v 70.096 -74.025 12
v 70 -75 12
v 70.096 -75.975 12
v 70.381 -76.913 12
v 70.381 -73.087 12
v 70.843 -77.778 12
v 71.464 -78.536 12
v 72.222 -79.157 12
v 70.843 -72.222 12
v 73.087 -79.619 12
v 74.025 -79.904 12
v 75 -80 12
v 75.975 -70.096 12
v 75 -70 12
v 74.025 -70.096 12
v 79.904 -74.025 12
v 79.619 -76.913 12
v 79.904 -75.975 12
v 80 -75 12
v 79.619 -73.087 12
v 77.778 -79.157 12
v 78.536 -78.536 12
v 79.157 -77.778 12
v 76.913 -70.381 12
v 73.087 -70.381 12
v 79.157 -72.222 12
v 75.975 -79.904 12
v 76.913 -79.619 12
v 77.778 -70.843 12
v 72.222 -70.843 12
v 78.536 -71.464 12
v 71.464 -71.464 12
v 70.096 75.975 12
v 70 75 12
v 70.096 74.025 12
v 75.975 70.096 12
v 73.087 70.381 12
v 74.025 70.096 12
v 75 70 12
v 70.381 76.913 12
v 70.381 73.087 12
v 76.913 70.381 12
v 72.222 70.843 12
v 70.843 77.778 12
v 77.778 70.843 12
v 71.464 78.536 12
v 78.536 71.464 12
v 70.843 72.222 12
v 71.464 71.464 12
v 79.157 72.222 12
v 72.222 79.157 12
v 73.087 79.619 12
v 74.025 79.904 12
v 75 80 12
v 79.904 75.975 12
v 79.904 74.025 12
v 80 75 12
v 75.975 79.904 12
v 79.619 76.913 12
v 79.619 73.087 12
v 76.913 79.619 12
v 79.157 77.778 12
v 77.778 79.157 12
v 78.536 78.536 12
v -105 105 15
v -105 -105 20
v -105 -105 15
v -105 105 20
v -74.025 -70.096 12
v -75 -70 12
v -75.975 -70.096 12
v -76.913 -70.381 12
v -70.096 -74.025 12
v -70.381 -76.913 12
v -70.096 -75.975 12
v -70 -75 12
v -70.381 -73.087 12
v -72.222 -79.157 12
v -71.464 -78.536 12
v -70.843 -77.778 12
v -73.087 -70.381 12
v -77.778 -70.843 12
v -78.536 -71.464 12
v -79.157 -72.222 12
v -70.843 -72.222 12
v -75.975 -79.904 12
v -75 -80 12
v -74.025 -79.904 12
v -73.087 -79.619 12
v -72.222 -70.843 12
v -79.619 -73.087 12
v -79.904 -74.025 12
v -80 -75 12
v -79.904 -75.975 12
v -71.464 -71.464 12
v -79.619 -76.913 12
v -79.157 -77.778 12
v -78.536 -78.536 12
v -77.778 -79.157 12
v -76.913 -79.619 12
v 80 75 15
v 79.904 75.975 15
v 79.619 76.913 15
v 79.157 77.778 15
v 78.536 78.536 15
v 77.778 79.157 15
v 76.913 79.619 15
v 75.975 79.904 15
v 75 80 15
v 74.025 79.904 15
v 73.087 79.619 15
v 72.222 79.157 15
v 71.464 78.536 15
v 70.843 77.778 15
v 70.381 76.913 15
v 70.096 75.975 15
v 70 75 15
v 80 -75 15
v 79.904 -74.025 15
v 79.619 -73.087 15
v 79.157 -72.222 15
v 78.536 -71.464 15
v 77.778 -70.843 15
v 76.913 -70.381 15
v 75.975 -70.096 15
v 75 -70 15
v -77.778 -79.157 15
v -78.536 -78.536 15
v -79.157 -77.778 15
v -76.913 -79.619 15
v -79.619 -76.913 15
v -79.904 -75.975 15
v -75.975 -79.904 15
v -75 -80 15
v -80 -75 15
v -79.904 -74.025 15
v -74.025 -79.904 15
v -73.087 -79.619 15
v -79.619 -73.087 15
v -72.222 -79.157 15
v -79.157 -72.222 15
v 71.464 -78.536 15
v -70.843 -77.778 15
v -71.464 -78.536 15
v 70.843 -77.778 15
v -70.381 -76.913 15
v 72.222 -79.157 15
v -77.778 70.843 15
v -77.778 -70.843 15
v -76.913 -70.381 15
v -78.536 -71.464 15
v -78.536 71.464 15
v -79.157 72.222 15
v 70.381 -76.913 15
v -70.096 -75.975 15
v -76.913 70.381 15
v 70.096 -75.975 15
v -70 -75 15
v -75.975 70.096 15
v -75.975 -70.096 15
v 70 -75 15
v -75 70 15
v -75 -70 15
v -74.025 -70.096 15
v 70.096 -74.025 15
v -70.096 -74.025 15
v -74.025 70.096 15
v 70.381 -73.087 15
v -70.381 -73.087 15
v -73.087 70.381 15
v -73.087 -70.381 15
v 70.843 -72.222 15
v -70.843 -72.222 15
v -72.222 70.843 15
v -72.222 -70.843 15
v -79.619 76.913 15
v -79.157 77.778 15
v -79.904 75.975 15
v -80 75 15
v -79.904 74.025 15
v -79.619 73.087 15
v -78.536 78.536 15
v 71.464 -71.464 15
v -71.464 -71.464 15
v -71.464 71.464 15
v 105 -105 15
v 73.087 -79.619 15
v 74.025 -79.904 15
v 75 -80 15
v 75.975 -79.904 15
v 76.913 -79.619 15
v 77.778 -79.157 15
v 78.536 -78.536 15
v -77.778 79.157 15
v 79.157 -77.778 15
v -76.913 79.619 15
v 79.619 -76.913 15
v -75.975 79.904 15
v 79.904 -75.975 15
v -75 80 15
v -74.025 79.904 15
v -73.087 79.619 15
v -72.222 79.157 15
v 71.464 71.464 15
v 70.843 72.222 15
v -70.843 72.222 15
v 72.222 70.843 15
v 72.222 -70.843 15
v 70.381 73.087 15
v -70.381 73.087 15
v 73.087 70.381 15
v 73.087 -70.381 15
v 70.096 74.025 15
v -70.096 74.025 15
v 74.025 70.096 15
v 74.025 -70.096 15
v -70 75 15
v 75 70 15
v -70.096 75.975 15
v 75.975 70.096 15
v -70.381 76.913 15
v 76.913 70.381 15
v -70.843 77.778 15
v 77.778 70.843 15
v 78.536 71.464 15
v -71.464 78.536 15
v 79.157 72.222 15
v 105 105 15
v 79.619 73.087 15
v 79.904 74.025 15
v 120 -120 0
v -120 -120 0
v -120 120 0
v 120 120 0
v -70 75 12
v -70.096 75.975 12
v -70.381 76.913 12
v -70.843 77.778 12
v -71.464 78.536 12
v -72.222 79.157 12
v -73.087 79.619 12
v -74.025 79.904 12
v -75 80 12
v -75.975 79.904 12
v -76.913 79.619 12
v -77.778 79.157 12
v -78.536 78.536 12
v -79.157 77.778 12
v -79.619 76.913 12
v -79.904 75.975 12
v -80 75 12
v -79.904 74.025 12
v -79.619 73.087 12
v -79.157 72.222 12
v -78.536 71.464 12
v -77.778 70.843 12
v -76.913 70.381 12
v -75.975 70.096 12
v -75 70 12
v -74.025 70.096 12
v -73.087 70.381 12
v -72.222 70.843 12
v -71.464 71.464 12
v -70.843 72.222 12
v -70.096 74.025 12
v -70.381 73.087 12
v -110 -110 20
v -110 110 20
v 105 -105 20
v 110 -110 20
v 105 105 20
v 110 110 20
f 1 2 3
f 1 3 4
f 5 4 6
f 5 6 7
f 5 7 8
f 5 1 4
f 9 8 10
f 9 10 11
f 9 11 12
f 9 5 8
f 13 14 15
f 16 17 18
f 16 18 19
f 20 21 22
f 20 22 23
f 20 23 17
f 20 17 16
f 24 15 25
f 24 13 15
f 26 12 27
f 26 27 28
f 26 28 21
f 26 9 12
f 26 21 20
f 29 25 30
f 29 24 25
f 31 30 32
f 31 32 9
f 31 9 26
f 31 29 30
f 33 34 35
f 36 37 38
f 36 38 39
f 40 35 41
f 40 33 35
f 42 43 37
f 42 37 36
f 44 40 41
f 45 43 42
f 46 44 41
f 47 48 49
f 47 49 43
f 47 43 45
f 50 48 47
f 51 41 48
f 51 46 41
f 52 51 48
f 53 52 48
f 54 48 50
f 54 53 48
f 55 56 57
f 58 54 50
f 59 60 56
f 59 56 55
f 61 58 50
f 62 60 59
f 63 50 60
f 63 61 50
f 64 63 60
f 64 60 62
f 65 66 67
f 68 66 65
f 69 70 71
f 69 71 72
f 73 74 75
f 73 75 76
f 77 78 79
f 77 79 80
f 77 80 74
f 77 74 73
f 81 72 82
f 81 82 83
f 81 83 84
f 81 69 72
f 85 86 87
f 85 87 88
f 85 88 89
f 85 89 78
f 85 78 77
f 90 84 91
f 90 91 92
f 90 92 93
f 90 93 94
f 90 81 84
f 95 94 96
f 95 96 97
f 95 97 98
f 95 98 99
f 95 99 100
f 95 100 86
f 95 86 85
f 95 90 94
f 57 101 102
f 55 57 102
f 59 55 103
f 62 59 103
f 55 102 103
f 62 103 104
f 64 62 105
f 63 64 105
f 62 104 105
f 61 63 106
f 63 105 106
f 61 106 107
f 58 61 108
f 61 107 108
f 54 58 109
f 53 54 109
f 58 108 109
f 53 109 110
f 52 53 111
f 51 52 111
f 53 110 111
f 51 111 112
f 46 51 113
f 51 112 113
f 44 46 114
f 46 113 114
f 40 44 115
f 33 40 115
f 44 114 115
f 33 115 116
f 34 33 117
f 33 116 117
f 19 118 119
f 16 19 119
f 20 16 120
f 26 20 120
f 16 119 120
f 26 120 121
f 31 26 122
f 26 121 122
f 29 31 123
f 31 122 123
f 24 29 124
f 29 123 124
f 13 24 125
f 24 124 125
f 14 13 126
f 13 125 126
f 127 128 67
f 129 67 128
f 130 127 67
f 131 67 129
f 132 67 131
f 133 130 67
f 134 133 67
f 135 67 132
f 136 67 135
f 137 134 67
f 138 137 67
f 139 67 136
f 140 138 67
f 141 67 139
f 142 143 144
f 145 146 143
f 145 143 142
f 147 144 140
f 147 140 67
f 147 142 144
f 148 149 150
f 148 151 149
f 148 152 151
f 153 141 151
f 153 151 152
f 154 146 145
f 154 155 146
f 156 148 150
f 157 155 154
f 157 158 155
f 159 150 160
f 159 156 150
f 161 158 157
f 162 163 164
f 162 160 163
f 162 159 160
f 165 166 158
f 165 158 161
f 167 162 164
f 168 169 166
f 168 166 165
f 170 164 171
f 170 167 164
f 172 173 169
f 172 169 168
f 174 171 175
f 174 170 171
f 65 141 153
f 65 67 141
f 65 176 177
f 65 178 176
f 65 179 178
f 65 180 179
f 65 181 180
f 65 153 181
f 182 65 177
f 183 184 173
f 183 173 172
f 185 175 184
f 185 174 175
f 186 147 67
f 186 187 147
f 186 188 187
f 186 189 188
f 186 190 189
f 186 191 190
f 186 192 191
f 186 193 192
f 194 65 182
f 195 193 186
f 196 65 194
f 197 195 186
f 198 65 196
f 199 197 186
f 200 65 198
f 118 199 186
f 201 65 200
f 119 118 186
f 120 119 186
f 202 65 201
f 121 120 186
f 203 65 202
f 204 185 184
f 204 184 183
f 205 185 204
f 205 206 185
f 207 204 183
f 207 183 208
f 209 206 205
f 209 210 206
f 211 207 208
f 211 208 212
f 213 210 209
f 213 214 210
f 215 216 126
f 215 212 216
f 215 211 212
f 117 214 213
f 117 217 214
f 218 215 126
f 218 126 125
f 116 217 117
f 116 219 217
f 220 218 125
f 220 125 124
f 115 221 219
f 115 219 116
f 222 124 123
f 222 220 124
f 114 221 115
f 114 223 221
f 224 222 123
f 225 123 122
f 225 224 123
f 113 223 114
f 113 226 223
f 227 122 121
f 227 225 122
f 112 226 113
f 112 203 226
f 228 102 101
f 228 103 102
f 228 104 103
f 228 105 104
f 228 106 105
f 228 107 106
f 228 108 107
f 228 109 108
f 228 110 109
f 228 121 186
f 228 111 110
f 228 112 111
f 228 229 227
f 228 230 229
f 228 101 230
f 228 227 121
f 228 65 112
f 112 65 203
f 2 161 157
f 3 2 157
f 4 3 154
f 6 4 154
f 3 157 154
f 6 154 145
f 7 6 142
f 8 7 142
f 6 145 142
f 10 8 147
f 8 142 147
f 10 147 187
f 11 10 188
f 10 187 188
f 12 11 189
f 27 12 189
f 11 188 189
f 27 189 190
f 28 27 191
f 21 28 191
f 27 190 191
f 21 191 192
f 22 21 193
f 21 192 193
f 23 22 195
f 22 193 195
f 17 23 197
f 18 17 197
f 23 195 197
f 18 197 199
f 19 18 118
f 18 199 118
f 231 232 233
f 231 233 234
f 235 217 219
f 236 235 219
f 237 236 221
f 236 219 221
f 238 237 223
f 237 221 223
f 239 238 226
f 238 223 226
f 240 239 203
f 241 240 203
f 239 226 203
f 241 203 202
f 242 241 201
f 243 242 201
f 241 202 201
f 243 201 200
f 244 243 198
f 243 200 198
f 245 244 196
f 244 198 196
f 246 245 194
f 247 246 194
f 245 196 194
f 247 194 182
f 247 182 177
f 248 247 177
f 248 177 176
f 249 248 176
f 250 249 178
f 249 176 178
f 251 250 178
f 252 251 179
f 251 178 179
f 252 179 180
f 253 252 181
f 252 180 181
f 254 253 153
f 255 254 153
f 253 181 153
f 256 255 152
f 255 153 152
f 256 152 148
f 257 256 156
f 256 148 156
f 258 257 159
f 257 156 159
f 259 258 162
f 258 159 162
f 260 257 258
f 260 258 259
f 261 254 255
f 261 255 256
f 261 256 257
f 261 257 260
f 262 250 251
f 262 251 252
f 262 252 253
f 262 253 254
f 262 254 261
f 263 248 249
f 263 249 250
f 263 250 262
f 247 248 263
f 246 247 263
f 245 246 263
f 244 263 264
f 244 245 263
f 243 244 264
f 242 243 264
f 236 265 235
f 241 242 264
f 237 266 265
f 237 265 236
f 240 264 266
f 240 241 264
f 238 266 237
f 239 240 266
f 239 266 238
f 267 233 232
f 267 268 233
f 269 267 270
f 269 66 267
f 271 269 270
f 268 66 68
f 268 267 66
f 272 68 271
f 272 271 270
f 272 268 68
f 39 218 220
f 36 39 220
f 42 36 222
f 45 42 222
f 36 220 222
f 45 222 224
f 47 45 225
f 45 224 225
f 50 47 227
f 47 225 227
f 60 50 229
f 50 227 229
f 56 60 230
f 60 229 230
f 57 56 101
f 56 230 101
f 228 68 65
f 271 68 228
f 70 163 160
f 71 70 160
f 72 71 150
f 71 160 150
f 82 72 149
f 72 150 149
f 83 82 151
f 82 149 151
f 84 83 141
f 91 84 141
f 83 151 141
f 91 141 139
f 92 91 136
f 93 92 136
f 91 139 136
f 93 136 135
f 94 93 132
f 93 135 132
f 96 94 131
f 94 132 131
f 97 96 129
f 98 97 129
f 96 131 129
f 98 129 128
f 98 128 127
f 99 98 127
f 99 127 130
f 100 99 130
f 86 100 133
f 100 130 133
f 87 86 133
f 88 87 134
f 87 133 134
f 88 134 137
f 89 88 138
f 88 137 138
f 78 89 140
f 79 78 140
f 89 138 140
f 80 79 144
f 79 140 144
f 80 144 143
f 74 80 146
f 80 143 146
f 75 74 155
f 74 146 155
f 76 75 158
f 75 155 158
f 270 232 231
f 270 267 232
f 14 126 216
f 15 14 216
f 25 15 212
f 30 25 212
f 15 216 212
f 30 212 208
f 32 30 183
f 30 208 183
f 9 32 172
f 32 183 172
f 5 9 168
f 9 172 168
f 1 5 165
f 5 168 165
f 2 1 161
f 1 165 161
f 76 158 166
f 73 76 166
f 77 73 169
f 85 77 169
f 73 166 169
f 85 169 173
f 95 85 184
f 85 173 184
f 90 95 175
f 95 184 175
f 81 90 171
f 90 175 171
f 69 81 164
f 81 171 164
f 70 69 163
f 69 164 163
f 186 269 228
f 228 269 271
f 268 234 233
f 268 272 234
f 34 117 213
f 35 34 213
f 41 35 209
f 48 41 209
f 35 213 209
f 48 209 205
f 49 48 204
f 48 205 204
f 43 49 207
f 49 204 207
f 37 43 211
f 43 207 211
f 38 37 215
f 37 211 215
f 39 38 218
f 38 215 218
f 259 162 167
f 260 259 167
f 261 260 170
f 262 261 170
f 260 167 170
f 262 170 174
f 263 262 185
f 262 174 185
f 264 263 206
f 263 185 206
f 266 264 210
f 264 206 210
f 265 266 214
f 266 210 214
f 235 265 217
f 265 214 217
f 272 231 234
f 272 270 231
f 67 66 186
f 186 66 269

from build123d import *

# Parameters (mm, degrees)
F0_W     = 240
F0_H     = 240
F2_W     = 220
F2_H     = 220
F4_W     = 210
F4_H     = 210
F5_DEPTH = 5
F7_DEPTH = 3


with BuildPart() as f3:
    # F0 (on Top) → F3 section 0
    with BuildSketch(Plane.XY):
        Rectangle(F0_W, F0_H)
    # F2 (on offset) → F3 section 1
    with BuildSketch(Plane.XY.offset(20)):
        Rectangle(F2_W, F2_H)
    loft()

    # F4 (on face) → F5 (cut)
    with BuildSketch(Plane.XY.offset(20)):
        Rectangle(F4_W, F4_H)
    extrude(amount=-F5_DEPTH, mode=Mode.SUBTRACT)

    # F6 (on face) → F7 (cut)
    with BuildSketch(Plane.XY.offset(15)):
        with BuildLine():
            ThreePointArc((-70, 75), (-78.5355339059, 78.5355339059), (-75, 70))
            Line((-75, 70), (-75, 75))
            Line((-75, 75), (-70, 75))
        make_face()
        with BuildLine():
            Line((-75, 75), (-75, 70))
            ThreePointArc((-75, 70), (-71.4644660941, 71.4644660941), (-70, 75))
            Line((-70, 75), (-75, 75))
        make_face()
        with BuildLine():
            ThreePointArc((70, 75), (71.4644660941, 71.4644660941), (75, 70))
            Line((75, 70), (75, 75))
            Line((75, 75), (70, 75))
        make_face()
        with BuildLine():
            Line((75, 75), (75, 70))
            ThreePointArc((75, 70), (78.5355339059, 71.4644660941), (80, 75))
            ThreePointArc((80, 75), (75, 80), (70, 75))
            Line((70, 75), (75, 75))
        make_face()
        with BuildLine():
            ThreePointArc((75, -70), (71.4644660941, -71.4644660941), (70, -75))
            Line((70, -75), (75, -75))
            Line((75, -75), (75, -70))
        make_face()
        with BuildLine():
            Line((75, -75), (70, -75))
            ThreePointArc((70, -75), (75, -80), (80, -75))
            ThreePointArc((80, -75), (78.5355339059, -71.4644660941), (75, -70))
            Line((75, -70), (75, -75))
        make_face()
        with BuildLine():
            Line((-75, -75), (-70, -75))
            ThreePointArc((-70, -75), (-71.4644660941, -71.4644660941), (-75, -70))
            Line((-75, -70), (-75, -75))
        make_face()
        with BuildLine():
            ThreePointArc((-75, -70), (-78.5355339059, -78.5355339059), (-70, -75))
            Line((-70, -75), (-75, -75))
            Line((-75, -75), (-75, -70))
        make_face()
    extrude(amount=-F7_DEPTH, mode=Mode.SUBTRACT)


solid = f3.part
